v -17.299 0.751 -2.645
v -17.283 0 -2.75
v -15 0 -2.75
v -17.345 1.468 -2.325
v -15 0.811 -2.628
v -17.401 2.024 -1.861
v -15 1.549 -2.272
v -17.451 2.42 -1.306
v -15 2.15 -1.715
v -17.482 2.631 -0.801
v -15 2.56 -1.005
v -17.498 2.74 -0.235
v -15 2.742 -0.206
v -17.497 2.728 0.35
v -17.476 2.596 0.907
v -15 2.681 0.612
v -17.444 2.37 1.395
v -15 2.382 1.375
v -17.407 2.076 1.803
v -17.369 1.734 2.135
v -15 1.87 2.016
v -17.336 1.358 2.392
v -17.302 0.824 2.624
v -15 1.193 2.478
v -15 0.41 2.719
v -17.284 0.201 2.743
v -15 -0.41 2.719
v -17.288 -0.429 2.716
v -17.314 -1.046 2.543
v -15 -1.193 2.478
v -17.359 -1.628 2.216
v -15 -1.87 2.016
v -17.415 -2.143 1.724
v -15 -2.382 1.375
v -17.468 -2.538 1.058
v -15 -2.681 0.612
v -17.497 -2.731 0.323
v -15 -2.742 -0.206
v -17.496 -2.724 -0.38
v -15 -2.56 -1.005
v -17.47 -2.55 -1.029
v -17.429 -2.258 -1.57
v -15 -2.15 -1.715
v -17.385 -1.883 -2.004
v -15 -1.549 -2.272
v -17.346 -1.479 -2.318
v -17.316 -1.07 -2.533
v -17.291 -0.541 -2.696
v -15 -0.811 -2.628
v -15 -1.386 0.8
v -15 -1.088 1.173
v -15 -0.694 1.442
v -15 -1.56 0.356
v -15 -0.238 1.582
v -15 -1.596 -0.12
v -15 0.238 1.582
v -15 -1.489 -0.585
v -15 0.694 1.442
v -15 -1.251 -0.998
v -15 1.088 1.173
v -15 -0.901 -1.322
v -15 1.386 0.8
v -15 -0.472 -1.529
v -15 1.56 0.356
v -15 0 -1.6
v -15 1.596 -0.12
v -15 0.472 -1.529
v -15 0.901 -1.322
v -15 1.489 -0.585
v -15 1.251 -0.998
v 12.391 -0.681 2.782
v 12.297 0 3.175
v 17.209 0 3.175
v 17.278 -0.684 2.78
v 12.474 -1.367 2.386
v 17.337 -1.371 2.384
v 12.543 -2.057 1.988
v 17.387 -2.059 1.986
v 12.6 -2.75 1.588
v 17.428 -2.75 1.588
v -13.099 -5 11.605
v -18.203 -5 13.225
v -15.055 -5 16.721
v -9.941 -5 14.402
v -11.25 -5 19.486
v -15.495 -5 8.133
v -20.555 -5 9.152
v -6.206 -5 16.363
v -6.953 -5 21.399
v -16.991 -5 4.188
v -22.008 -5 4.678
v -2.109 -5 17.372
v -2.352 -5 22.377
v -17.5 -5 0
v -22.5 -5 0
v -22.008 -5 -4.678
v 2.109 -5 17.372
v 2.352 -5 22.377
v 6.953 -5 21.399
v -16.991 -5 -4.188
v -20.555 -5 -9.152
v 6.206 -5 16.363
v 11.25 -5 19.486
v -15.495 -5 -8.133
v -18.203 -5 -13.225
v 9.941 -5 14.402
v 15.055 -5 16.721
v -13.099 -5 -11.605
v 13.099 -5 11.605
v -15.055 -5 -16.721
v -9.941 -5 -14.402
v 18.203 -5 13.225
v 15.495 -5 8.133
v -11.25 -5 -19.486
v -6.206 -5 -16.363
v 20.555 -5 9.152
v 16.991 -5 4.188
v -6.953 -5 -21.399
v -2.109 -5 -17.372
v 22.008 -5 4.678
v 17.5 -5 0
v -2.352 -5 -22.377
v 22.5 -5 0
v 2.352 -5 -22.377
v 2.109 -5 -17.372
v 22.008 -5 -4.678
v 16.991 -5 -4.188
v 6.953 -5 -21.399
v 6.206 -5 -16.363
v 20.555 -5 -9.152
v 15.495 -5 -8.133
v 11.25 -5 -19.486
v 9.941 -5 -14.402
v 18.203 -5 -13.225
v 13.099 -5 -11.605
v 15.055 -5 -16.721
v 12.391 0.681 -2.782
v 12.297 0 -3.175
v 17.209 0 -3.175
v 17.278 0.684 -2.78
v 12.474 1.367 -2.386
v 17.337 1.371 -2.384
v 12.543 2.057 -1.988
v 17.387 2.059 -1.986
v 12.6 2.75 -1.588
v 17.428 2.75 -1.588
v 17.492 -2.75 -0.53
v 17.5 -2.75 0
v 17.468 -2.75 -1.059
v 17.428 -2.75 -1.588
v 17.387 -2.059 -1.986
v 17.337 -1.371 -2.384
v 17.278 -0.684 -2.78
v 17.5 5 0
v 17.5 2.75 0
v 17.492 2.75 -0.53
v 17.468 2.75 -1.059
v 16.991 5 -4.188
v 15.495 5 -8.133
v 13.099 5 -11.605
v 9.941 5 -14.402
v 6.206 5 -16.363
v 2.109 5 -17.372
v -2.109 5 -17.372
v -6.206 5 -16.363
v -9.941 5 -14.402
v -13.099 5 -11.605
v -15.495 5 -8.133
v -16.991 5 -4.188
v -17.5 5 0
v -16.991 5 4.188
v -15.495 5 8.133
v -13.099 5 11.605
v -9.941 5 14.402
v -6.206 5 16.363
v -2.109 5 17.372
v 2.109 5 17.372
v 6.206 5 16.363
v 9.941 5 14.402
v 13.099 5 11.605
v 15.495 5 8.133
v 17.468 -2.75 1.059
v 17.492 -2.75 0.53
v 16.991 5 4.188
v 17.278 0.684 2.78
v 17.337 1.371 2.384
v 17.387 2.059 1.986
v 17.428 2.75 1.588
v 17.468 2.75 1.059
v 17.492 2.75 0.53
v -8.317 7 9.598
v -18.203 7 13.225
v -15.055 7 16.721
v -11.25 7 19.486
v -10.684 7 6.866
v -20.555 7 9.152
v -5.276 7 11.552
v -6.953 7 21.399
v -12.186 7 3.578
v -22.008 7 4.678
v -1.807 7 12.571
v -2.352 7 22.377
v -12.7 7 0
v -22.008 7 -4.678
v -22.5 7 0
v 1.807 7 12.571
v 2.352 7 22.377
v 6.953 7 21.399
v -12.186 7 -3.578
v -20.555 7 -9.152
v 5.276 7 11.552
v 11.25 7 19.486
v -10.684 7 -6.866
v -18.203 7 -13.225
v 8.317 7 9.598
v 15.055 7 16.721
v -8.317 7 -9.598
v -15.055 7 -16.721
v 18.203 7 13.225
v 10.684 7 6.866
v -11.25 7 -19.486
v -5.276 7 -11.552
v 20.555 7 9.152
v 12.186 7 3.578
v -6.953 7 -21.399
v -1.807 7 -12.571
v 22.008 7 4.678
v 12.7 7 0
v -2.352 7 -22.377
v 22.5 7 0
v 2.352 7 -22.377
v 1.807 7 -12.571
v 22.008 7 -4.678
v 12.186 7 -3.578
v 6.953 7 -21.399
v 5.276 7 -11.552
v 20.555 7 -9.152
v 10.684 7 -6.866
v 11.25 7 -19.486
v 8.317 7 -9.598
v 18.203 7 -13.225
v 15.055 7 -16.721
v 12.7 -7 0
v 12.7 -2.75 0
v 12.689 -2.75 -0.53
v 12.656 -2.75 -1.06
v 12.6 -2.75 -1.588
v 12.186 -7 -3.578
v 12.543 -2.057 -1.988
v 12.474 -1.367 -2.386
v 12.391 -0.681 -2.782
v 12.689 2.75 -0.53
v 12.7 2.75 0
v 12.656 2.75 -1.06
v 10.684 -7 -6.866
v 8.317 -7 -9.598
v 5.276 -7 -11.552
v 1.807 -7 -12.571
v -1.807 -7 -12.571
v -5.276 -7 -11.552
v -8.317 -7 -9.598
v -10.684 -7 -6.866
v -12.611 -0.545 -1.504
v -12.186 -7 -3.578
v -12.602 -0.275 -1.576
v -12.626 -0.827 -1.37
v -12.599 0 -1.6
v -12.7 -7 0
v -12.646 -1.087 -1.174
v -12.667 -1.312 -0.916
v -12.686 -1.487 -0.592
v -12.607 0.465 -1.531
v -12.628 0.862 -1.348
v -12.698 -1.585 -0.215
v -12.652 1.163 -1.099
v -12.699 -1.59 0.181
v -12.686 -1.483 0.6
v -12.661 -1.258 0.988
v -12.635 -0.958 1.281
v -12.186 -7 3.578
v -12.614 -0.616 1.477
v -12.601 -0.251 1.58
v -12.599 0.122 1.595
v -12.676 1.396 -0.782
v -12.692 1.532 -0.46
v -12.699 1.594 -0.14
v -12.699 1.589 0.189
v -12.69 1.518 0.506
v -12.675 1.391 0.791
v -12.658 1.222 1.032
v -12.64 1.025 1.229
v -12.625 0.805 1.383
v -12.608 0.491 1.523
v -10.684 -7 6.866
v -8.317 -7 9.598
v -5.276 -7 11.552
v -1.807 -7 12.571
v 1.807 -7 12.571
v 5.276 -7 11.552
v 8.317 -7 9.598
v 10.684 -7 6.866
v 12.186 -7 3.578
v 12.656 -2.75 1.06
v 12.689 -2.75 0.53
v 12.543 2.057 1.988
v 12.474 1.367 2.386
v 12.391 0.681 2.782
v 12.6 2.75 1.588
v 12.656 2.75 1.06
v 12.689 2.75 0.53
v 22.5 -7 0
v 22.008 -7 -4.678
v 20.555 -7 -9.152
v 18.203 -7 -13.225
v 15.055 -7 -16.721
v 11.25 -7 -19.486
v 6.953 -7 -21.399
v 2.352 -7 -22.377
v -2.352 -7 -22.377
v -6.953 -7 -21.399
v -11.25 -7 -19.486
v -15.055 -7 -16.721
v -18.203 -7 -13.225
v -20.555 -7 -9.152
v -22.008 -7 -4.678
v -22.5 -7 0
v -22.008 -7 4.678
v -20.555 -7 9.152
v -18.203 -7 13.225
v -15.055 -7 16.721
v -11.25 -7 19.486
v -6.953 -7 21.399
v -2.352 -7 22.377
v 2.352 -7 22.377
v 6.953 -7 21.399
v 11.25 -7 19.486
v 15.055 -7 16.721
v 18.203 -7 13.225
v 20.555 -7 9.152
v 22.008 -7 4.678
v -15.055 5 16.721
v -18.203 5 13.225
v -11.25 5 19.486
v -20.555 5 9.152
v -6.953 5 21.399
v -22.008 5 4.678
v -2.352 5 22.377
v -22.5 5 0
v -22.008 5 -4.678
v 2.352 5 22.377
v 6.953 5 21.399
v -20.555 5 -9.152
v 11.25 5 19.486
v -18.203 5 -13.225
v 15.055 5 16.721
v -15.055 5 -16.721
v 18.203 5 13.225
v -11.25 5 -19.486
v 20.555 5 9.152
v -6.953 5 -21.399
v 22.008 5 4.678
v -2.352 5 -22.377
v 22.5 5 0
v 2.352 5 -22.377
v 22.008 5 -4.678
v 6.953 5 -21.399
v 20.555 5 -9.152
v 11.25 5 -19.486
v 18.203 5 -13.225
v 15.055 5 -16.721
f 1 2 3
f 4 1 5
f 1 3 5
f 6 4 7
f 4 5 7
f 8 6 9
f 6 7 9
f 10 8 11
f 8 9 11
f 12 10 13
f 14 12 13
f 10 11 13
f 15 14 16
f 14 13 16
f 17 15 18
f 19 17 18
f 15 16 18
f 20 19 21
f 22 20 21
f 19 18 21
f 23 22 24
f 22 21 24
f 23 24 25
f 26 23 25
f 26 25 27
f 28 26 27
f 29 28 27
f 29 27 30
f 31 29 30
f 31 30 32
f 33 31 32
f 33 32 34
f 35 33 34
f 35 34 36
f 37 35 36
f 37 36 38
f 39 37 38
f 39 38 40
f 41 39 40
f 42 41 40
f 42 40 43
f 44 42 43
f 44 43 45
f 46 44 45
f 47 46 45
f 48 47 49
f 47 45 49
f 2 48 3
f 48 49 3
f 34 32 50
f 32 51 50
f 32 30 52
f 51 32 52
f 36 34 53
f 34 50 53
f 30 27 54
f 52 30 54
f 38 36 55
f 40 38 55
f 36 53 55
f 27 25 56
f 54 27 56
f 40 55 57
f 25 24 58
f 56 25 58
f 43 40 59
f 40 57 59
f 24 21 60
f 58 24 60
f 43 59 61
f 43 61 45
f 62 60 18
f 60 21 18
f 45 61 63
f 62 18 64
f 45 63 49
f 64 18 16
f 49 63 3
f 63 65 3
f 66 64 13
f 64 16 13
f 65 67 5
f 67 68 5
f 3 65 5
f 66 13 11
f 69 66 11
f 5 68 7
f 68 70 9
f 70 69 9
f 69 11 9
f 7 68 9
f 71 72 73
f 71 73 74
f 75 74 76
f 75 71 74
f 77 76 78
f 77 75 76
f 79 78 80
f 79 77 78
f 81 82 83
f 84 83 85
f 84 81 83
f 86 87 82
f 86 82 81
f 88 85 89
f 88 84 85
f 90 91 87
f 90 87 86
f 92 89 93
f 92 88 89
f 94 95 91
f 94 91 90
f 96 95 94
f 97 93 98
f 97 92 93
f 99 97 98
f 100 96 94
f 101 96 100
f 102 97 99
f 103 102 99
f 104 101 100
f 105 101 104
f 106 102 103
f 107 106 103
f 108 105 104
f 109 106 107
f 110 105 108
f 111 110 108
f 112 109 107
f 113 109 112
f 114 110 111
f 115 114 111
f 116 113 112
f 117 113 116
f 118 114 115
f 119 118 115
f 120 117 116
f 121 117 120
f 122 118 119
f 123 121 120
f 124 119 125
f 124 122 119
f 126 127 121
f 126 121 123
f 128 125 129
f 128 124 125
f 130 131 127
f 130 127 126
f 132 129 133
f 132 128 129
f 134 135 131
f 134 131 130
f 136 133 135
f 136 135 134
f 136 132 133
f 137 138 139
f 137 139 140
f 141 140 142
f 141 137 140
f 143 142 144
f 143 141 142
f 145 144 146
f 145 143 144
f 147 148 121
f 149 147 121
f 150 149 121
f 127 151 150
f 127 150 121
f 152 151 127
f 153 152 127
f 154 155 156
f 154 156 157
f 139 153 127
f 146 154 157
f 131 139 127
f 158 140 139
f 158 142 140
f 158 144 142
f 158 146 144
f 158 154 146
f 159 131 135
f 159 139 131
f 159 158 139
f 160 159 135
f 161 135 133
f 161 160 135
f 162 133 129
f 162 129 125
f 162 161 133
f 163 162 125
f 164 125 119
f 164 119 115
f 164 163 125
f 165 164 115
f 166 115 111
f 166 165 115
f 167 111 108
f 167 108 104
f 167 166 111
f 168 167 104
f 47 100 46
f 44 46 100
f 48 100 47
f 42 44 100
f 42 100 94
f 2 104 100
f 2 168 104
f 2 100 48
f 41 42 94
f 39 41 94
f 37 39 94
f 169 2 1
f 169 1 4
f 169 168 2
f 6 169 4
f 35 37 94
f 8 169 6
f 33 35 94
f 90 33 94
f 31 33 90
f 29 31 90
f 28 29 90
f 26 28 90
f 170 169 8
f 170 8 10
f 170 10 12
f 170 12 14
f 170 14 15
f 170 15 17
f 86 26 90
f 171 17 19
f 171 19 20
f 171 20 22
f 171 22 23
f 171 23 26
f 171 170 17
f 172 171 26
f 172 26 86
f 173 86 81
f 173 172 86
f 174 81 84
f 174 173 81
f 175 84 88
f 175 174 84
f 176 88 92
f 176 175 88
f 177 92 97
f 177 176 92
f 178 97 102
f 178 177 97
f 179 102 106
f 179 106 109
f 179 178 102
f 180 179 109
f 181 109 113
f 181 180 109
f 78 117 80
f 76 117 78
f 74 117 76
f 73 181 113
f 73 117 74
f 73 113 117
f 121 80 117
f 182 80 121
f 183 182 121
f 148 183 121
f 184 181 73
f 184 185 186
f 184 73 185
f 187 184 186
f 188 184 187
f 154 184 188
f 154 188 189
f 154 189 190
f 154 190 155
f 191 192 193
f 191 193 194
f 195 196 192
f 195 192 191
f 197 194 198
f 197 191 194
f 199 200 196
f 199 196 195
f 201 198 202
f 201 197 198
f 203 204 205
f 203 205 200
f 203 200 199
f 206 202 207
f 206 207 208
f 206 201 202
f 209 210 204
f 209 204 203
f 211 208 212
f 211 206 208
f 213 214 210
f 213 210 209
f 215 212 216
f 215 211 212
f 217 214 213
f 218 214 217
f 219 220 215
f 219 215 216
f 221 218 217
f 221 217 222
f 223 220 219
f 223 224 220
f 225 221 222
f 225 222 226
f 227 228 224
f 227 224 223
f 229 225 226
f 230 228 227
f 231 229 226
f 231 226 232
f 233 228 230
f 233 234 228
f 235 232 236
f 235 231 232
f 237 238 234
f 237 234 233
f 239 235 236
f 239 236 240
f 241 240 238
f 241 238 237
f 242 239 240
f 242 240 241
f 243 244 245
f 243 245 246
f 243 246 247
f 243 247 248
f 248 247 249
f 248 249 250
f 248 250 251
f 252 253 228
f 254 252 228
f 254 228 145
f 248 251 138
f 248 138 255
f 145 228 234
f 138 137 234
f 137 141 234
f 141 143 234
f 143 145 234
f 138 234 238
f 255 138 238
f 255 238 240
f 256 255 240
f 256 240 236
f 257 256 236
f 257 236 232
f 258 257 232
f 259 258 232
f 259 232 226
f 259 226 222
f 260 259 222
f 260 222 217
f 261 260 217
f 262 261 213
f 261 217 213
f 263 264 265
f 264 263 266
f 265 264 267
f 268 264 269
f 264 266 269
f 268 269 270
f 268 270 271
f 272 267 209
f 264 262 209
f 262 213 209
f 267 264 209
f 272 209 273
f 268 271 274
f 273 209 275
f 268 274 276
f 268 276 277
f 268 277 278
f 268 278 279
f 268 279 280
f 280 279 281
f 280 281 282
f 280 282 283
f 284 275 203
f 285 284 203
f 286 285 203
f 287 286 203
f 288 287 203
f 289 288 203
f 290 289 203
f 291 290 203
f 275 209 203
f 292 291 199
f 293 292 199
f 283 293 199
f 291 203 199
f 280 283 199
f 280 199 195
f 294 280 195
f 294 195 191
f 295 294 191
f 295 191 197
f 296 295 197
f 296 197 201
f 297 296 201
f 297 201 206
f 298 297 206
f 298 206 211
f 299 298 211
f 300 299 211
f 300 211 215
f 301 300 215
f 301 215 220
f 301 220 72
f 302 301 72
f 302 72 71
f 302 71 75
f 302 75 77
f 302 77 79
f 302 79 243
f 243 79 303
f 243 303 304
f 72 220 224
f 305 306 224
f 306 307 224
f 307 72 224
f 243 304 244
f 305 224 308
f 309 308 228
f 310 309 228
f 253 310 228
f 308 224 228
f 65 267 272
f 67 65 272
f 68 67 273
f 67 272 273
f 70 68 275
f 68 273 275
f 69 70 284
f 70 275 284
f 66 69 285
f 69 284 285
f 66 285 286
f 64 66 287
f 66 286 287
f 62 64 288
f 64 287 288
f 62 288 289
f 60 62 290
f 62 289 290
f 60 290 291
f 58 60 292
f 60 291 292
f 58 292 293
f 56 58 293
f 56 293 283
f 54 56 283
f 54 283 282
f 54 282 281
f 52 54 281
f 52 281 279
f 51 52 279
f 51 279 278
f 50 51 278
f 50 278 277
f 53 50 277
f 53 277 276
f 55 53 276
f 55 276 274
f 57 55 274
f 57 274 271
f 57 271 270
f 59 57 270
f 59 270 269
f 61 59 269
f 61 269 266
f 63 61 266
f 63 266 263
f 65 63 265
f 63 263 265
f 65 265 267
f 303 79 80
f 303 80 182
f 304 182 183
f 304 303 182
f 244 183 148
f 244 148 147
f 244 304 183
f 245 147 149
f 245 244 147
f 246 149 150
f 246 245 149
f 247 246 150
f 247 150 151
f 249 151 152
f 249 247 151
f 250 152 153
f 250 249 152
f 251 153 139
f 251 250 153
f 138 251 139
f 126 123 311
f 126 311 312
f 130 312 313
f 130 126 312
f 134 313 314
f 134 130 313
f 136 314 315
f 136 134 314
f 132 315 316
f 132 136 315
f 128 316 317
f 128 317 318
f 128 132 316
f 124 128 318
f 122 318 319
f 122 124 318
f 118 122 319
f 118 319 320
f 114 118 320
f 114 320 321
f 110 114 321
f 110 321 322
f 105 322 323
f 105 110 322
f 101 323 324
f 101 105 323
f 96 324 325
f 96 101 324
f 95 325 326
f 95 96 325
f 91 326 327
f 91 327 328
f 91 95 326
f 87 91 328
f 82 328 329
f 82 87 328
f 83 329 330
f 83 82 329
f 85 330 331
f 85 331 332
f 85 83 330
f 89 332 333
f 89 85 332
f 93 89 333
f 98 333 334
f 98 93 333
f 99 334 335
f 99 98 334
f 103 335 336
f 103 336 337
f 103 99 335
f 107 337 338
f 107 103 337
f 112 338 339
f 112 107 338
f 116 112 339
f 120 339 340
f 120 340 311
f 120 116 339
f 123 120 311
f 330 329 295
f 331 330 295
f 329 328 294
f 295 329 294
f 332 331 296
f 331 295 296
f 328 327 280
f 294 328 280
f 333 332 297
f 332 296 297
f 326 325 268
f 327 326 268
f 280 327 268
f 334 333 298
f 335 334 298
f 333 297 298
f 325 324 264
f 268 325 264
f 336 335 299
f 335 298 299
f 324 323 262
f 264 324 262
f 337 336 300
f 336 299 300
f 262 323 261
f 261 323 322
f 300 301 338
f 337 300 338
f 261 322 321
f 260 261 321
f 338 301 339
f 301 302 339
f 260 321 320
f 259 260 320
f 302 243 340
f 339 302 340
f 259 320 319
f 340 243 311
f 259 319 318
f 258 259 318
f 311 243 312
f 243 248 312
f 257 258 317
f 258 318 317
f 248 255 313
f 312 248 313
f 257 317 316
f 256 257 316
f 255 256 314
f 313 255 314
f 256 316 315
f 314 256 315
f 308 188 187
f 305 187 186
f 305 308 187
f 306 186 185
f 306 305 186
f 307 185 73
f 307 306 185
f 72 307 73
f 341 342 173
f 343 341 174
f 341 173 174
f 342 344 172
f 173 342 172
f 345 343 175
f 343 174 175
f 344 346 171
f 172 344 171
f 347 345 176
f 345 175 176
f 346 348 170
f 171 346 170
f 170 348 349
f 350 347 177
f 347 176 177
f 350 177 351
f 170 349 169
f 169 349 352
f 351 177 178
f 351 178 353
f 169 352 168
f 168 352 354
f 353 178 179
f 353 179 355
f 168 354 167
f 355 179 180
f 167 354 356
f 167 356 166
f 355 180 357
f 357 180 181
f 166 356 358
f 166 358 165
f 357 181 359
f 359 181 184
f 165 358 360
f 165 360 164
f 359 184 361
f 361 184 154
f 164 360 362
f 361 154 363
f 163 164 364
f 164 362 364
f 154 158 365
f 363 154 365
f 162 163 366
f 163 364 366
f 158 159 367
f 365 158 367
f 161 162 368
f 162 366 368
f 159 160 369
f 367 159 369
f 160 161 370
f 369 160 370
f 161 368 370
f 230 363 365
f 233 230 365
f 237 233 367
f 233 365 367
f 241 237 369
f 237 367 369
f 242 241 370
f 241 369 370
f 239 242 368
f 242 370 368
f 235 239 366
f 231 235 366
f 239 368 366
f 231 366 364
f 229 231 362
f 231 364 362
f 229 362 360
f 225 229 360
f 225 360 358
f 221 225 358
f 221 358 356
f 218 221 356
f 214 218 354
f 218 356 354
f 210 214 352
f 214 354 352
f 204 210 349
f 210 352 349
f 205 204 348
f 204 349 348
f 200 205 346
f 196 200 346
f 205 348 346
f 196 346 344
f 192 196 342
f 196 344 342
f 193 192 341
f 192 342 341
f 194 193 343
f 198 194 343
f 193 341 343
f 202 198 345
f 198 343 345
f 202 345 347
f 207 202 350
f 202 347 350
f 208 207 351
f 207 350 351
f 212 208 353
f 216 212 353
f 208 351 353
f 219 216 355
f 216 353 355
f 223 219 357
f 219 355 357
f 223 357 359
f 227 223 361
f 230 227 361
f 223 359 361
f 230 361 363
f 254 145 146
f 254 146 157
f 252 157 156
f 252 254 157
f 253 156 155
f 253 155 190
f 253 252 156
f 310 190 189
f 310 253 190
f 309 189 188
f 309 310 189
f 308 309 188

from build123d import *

# Parameters (mm, degrees)
SKETCH1_R           = 17.5
SKETCH1_R_2         = 12.7
BOSS_EXTRUDE1_DEPTH = 5
SKETCH2_R           = 22.5
SKETCH2_R_2         = 12.7
BOSS_EXTRUDE2_DEPTH = 2
SKETCH3_R           = 1.6
CUT_EXTRUDE1_DEPTH  = 23.5
CUT_EXTRUDE2_DEPTH  = 23.5
SKETCH5_R           = 2.75
CUT_EXTRUDE3_DEPTH  = 8.5


with BuildPart() as part:
    # Sketch1 → Boss-Extrude1 (new body, symmetric)
    with BuildSketch(Plane(origin=(0, 0, 0), x_dir=(1, 0, 0), z_dir=(0, 1, 0))):
        Circle(SKETCH1_R)
        Circle(SKETCH1_R_2, mode=Mode.SUBTRACT)
    extrude(amount=BOSS_EXTRUDE1_DEPTH, both=True)

    # Sketch2 → Boss-Extrude2 (add)
    with BuildSketch(Plane(origin=(0, 5, 0), x_dir=(1, 0, 0), z_dir=(0, 1, 0))):
        Circle(SKETCH2_R)
        Circle(SKETCH2_R_2, mode=Mode.SUBTRACT)
    boss_extrude2 = extrude(amount=BOSS_EXTRUDE2_DEPTH)

    # Mirror1: Boss-Extrude2 across plane
    add(boss_extrude2.mirror(Plane.ZX))

    # Sketch3 → Cut-Extrude1 (cut, through all)
    with BuildSketch(Plane(origin=(0, 0, 0), x_dir=(0, 0, -1), z_dir=(1, 0, 0))):
        Circle(SKETCH3_R)
    extrude(amount=-CUT_EXTRUDE1_DEPTH, mode=Mode.SUBTRACT)

    # Sketch4 → Cut-Extrude2 (cut, through all)
    with BuildSketch(Plane(origin=(0, 0, 0), x_dir=(0, 0, -1), z_dir=(1, 0, 0))):
        Polygon((3.175426481, 0), (1.58771324, 2.75), (-1.58771324, 2.75), (-3.175426481, 0), (-1.58771324, -2.75), (1.58771324, -2.75), align=None)
    extrude(amount=CUT_EXTRUDE2_DEPTH, mode=Mode.SUBTRACT)

    # Sketch5 → Cut-Extrude3 (cut, through all)
    with BuildSketch(Plane(origin=(-15, 0, 0), x_dir=(0, 0, -1), z_dir=(1, 0, 0))):
        Circle(SKETCH5_R)
    extrude(amount=-CUT_EXTRUDE3_DEPTH, mode=Mode.SUBTRACT)


solid = part.part
